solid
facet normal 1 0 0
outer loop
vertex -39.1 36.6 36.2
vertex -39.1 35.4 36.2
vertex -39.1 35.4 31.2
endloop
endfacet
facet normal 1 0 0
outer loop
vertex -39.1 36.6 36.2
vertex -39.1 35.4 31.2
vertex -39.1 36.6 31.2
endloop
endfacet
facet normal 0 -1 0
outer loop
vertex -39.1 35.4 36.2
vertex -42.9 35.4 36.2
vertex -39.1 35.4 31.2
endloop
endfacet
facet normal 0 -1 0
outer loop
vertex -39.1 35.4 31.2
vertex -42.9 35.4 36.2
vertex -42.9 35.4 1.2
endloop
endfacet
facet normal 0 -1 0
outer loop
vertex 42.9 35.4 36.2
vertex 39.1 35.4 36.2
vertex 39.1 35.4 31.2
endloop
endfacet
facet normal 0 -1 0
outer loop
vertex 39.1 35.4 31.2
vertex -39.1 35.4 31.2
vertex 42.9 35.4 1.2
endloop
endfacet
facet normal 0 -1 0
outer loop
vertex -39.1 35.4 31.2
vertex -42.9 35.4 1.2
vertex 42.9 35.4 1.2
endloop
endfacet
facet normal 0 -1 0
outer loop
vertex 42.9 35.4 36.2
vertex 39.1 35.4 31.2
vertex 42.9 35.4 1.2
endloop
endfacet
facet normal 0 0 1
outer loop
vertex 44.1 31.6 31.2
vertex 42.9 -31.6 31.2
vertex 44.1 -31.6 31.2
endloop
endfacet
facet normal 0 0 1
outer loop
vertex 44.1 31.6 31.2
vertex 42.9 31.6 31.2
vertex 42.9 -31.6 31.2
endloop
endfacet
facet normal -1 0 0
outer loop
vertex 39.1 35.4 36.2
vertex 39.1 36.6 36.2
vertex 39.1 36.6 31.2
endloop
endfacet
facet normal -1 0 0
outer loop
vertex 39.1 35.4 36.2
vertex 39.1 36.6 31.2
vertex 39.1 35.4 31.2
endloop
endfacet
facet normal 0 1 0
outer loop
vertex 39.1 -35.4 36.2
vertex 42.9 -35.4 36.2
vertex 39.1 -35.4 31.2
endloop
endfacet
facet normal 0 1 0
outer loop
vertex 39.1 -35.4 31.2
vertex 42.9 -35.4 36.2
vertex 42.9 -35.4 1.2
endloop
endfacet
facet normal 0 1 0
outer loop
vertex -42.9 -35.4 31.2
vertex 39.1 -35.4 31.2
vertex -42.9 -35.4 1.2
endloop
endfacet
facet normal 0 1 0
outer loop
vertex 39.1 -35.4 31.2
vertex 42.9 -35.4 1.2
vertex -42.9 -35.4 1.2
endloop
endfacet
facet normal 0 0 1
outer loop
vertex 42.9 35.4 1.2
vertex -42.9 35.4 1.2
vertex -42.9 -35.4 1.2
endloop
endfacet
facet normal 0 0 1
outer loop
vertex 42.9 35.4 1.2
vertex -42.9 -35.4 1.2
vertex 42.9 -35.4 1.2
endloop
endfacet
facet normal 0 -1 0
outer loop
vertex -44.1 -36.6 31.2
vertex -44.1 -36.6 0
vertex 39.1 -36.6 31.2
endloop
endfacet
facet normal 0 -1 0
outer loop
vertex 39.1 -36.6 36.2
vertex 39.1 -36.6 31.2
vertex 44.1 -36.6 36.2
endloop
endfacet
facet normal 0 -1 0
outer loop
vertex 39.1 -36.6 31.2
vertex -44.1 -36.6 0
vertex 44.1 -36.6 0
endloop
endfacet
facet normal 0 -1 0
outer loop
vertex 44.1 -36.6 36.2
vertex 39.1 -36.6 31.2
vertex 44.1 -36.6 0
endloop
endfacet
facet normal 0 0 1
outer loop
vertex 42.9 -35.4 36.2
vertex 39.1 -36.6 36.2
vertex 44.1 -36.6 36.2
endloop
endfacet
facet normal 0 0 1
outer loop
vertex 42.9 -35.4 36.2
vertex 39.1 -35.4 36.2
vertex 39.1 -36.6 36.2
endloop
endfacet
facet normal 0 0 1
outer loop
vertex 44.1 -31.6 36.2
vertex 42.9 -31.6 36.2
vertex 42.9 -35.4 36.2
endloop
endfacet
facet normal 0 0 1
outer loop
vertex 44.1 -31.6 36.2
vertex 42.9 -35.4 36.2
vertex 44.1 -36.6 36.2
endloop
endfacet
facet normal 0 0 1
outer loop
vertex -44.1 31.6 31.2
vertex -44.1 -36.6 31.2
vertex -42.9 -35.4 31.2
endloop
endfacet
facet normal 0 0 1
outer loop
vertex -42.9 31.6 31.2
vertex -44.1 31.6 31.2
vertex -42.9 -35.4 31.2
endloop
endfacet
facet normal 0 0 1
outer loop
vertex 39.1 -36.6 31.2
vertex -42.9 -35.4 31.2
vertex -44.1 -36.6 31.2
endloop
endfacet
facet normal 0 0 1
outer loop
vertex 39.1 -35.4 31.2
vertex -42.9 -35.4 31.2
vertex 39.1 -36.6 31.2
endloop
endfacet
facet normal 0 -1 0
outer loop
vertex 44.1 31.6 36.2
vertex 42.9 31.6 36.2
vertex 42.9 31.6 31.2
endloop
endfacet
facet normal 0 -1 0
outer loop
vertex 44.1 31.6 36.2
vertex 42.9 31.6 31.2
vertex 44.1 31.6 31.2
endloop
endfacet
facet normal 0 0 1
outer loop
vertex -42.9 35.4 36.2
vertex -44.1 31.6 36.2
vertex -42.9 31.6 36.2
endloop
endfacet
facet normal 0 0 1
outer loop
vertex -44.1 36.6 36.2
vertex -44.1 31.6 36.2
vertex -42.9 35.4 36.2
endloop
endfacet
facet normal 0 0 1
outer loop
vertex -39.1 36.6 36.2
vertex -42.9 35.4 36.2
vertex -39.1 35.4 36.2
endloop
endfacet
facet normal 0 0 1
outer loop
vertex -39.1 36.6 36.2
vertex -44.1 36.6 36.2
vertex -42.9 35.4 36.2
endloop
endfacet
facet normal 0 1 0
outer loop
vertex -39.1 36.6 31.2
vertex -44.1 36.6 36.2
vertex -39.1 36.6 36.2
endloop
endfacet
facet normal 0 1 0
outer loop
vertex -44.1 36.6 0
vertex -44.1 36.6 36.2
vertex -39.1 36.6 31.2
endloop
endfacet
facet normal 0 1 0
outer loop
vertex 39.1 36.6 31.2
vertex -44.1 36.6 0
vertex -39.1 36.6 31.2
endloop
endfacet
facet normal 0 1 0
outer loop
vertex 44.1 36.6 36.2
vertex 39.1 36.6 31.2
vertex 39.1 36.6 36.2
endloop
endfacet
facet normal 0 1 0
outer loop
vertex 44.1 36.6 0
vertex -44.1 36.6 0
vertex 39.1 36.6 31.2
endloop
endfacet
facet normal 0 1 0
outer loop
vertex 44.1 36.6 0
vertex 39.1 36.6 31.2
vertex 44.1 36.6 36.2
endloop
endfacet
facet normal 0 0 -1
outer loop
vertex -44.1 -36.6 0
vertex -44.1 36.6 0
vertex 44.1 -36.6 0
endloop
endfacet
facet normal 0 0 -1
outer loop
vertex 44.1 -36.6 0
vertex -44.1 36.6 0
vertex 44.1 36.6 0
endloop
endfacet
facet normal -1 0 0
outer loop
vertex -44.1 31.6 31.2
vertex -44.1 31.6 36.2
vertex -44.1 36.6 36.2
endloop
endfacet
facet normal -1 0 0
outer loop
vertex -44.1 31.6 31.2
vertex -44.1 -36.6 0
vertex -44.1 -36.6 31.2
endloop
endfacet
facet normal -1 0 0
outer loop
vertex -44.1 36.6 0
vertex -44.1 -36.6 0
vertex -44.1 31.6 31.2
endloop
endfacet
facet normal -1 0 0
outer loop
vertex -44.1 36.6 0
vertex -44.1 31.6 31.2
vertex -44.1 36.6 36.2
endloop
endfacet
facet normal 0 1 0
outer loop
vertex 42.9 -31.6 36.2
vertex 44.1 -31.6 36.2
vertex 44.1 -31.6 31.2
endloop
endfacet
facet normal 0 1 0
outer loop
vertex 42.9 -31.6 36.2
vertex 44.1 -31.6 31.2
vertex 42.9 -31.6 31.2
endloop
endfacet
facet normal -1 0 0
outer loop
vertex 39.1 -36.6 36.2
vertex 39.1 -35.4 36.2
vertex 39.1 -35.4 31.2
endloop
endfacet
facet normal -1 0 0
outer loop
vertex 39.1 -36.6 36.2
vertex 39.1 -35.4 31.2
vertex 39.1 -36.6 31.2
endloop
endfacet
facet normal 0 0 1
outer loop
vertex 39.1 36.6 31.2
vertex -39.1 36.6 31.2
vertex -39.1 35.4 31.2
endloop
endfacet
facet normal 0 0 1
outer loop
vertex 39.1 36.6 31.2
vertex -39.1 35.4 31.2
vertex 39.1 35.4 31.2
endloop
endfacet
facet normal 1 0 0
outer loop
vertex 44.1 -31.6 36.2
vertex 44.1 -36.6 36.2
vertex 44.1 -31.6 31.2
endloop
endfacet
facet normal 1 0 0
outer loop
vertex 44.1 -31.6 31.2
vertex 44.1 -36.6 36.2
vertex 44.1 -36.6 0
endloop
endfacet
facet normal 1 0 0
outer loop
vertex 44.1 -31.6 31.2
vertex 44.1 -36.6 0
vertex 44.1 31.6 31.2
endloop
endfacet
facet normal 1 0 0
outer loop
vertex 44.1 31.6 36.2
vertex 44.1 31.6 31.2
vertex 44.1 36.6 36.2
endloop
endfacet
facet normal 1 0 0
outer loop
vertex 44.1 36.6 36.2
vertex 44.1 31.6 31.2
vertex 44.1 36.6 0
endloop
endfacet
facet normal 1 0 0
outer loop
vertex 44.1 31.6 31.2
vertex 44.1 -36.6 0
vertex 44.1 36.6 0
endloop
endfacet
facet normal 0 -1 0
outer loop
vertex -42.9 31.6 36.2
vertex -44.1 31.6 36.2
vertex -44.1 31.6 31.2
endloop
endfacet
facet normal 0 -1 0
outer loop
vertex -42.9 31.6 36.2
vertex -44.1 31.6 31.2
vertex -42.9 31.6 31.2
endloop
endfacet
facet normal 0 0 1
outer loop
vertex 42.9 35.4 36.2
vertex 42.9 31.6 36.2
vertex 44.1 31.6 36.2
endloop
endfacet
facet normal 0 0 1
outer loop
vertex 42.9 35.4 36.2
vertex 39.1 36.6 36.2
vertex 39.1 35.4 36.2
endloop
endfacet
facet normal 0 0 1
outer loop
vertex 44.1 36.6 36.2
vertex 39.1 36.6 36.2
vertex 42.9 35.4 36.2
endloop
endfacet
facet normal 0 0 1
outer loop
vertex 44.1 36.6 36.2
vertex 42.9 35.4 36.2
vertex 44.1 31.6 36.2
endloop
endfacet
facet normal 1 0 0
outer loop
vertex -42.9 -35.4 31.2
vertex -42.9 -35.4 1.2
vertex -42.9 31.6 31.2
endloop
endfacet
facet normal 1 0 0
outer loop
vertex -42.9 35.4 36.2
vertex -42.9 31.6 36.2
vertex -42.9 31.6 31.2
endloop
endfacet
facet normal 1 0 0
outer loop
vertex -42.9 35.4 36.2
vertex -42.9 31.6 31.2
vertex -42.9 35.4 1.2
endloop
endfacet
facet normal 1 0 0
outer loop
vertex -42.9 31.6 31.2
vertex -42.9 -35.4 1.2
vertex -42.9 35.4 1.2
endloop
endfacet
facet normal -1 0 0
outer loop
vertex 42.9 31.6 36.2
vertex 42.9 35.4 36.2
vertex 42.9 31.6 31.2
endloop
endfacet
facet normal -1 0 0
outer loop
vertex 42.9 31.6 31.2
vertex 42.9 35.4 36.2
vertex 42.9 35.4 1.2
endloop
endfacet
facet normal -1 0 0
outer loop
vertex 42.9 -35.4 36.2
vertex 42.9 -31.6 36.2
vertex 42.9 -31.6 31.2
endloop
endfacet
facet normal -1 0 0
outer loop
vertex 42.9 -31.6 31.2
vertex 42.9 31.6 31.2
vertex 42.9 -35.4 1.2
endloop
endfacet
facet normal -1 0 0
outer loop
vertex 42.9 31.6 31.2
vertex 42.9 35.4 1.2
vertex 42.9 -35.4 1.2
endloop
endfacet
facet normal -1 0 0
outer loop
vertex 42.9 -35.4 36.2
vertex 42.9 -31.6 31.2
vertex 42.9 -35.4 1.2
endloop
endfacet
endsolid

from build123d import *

# Parameters (mm, degrees)
F0_W     = 88.2
F0_H     = 73.2
F1_DEPTH = 1.2
F2_W     = 88.2
F2_H     = 73.2
F2_W_2   = 85.8
F2_H_2   = 70.8
F3_DEPTH = 30
F5_DEPTH = 5


with BuildPart() as f1:
    # F0 (on Top) → F1 (new body)
    with BuildSketch(Plane.XY):
        Rectangle(F0_W, F0_H)
    extrude(amount=F1_DEPTH)

    # F2 (on face) → F3 (join)
    with BuildSketch(Plane.XY.offset(1.2)):
        Rectangle(F2_W, F2_H)
        Rectangle(F2_W_2, F2_H_2, mode=Mode.SUBTRACT)
    extrude(amount=F3_DEPTH)

    # F4 (on face) → F5 (join)
    with BuildSketch(Plane.XY.offset(31.2)):
        Polygon((39.1, -36.6), (44.1, -36.6), (44.1, -35.4), (44.1, -31.6), (42.9, -31.6), (42.9, -35.4), (39.1, -35.4), align=None)
        Polygon((42.9, 31.6), (44.1, 31.6), (44.1, 35.4), (44.1, 36.6), (39.1, 36.6), (39.1, 35.4), (42.9, 35.4), align=None)
        Polygon((-44.1, 35.4), (-44.1, 31.6), (-42.9, 31.6), (-42.9, 35.4), (-39.1, 35.4), (-39.1, 36.6), (-44.1, 36.6), align=None)
    extrude(amount=F5_DEPTH)


solid = f1.part
